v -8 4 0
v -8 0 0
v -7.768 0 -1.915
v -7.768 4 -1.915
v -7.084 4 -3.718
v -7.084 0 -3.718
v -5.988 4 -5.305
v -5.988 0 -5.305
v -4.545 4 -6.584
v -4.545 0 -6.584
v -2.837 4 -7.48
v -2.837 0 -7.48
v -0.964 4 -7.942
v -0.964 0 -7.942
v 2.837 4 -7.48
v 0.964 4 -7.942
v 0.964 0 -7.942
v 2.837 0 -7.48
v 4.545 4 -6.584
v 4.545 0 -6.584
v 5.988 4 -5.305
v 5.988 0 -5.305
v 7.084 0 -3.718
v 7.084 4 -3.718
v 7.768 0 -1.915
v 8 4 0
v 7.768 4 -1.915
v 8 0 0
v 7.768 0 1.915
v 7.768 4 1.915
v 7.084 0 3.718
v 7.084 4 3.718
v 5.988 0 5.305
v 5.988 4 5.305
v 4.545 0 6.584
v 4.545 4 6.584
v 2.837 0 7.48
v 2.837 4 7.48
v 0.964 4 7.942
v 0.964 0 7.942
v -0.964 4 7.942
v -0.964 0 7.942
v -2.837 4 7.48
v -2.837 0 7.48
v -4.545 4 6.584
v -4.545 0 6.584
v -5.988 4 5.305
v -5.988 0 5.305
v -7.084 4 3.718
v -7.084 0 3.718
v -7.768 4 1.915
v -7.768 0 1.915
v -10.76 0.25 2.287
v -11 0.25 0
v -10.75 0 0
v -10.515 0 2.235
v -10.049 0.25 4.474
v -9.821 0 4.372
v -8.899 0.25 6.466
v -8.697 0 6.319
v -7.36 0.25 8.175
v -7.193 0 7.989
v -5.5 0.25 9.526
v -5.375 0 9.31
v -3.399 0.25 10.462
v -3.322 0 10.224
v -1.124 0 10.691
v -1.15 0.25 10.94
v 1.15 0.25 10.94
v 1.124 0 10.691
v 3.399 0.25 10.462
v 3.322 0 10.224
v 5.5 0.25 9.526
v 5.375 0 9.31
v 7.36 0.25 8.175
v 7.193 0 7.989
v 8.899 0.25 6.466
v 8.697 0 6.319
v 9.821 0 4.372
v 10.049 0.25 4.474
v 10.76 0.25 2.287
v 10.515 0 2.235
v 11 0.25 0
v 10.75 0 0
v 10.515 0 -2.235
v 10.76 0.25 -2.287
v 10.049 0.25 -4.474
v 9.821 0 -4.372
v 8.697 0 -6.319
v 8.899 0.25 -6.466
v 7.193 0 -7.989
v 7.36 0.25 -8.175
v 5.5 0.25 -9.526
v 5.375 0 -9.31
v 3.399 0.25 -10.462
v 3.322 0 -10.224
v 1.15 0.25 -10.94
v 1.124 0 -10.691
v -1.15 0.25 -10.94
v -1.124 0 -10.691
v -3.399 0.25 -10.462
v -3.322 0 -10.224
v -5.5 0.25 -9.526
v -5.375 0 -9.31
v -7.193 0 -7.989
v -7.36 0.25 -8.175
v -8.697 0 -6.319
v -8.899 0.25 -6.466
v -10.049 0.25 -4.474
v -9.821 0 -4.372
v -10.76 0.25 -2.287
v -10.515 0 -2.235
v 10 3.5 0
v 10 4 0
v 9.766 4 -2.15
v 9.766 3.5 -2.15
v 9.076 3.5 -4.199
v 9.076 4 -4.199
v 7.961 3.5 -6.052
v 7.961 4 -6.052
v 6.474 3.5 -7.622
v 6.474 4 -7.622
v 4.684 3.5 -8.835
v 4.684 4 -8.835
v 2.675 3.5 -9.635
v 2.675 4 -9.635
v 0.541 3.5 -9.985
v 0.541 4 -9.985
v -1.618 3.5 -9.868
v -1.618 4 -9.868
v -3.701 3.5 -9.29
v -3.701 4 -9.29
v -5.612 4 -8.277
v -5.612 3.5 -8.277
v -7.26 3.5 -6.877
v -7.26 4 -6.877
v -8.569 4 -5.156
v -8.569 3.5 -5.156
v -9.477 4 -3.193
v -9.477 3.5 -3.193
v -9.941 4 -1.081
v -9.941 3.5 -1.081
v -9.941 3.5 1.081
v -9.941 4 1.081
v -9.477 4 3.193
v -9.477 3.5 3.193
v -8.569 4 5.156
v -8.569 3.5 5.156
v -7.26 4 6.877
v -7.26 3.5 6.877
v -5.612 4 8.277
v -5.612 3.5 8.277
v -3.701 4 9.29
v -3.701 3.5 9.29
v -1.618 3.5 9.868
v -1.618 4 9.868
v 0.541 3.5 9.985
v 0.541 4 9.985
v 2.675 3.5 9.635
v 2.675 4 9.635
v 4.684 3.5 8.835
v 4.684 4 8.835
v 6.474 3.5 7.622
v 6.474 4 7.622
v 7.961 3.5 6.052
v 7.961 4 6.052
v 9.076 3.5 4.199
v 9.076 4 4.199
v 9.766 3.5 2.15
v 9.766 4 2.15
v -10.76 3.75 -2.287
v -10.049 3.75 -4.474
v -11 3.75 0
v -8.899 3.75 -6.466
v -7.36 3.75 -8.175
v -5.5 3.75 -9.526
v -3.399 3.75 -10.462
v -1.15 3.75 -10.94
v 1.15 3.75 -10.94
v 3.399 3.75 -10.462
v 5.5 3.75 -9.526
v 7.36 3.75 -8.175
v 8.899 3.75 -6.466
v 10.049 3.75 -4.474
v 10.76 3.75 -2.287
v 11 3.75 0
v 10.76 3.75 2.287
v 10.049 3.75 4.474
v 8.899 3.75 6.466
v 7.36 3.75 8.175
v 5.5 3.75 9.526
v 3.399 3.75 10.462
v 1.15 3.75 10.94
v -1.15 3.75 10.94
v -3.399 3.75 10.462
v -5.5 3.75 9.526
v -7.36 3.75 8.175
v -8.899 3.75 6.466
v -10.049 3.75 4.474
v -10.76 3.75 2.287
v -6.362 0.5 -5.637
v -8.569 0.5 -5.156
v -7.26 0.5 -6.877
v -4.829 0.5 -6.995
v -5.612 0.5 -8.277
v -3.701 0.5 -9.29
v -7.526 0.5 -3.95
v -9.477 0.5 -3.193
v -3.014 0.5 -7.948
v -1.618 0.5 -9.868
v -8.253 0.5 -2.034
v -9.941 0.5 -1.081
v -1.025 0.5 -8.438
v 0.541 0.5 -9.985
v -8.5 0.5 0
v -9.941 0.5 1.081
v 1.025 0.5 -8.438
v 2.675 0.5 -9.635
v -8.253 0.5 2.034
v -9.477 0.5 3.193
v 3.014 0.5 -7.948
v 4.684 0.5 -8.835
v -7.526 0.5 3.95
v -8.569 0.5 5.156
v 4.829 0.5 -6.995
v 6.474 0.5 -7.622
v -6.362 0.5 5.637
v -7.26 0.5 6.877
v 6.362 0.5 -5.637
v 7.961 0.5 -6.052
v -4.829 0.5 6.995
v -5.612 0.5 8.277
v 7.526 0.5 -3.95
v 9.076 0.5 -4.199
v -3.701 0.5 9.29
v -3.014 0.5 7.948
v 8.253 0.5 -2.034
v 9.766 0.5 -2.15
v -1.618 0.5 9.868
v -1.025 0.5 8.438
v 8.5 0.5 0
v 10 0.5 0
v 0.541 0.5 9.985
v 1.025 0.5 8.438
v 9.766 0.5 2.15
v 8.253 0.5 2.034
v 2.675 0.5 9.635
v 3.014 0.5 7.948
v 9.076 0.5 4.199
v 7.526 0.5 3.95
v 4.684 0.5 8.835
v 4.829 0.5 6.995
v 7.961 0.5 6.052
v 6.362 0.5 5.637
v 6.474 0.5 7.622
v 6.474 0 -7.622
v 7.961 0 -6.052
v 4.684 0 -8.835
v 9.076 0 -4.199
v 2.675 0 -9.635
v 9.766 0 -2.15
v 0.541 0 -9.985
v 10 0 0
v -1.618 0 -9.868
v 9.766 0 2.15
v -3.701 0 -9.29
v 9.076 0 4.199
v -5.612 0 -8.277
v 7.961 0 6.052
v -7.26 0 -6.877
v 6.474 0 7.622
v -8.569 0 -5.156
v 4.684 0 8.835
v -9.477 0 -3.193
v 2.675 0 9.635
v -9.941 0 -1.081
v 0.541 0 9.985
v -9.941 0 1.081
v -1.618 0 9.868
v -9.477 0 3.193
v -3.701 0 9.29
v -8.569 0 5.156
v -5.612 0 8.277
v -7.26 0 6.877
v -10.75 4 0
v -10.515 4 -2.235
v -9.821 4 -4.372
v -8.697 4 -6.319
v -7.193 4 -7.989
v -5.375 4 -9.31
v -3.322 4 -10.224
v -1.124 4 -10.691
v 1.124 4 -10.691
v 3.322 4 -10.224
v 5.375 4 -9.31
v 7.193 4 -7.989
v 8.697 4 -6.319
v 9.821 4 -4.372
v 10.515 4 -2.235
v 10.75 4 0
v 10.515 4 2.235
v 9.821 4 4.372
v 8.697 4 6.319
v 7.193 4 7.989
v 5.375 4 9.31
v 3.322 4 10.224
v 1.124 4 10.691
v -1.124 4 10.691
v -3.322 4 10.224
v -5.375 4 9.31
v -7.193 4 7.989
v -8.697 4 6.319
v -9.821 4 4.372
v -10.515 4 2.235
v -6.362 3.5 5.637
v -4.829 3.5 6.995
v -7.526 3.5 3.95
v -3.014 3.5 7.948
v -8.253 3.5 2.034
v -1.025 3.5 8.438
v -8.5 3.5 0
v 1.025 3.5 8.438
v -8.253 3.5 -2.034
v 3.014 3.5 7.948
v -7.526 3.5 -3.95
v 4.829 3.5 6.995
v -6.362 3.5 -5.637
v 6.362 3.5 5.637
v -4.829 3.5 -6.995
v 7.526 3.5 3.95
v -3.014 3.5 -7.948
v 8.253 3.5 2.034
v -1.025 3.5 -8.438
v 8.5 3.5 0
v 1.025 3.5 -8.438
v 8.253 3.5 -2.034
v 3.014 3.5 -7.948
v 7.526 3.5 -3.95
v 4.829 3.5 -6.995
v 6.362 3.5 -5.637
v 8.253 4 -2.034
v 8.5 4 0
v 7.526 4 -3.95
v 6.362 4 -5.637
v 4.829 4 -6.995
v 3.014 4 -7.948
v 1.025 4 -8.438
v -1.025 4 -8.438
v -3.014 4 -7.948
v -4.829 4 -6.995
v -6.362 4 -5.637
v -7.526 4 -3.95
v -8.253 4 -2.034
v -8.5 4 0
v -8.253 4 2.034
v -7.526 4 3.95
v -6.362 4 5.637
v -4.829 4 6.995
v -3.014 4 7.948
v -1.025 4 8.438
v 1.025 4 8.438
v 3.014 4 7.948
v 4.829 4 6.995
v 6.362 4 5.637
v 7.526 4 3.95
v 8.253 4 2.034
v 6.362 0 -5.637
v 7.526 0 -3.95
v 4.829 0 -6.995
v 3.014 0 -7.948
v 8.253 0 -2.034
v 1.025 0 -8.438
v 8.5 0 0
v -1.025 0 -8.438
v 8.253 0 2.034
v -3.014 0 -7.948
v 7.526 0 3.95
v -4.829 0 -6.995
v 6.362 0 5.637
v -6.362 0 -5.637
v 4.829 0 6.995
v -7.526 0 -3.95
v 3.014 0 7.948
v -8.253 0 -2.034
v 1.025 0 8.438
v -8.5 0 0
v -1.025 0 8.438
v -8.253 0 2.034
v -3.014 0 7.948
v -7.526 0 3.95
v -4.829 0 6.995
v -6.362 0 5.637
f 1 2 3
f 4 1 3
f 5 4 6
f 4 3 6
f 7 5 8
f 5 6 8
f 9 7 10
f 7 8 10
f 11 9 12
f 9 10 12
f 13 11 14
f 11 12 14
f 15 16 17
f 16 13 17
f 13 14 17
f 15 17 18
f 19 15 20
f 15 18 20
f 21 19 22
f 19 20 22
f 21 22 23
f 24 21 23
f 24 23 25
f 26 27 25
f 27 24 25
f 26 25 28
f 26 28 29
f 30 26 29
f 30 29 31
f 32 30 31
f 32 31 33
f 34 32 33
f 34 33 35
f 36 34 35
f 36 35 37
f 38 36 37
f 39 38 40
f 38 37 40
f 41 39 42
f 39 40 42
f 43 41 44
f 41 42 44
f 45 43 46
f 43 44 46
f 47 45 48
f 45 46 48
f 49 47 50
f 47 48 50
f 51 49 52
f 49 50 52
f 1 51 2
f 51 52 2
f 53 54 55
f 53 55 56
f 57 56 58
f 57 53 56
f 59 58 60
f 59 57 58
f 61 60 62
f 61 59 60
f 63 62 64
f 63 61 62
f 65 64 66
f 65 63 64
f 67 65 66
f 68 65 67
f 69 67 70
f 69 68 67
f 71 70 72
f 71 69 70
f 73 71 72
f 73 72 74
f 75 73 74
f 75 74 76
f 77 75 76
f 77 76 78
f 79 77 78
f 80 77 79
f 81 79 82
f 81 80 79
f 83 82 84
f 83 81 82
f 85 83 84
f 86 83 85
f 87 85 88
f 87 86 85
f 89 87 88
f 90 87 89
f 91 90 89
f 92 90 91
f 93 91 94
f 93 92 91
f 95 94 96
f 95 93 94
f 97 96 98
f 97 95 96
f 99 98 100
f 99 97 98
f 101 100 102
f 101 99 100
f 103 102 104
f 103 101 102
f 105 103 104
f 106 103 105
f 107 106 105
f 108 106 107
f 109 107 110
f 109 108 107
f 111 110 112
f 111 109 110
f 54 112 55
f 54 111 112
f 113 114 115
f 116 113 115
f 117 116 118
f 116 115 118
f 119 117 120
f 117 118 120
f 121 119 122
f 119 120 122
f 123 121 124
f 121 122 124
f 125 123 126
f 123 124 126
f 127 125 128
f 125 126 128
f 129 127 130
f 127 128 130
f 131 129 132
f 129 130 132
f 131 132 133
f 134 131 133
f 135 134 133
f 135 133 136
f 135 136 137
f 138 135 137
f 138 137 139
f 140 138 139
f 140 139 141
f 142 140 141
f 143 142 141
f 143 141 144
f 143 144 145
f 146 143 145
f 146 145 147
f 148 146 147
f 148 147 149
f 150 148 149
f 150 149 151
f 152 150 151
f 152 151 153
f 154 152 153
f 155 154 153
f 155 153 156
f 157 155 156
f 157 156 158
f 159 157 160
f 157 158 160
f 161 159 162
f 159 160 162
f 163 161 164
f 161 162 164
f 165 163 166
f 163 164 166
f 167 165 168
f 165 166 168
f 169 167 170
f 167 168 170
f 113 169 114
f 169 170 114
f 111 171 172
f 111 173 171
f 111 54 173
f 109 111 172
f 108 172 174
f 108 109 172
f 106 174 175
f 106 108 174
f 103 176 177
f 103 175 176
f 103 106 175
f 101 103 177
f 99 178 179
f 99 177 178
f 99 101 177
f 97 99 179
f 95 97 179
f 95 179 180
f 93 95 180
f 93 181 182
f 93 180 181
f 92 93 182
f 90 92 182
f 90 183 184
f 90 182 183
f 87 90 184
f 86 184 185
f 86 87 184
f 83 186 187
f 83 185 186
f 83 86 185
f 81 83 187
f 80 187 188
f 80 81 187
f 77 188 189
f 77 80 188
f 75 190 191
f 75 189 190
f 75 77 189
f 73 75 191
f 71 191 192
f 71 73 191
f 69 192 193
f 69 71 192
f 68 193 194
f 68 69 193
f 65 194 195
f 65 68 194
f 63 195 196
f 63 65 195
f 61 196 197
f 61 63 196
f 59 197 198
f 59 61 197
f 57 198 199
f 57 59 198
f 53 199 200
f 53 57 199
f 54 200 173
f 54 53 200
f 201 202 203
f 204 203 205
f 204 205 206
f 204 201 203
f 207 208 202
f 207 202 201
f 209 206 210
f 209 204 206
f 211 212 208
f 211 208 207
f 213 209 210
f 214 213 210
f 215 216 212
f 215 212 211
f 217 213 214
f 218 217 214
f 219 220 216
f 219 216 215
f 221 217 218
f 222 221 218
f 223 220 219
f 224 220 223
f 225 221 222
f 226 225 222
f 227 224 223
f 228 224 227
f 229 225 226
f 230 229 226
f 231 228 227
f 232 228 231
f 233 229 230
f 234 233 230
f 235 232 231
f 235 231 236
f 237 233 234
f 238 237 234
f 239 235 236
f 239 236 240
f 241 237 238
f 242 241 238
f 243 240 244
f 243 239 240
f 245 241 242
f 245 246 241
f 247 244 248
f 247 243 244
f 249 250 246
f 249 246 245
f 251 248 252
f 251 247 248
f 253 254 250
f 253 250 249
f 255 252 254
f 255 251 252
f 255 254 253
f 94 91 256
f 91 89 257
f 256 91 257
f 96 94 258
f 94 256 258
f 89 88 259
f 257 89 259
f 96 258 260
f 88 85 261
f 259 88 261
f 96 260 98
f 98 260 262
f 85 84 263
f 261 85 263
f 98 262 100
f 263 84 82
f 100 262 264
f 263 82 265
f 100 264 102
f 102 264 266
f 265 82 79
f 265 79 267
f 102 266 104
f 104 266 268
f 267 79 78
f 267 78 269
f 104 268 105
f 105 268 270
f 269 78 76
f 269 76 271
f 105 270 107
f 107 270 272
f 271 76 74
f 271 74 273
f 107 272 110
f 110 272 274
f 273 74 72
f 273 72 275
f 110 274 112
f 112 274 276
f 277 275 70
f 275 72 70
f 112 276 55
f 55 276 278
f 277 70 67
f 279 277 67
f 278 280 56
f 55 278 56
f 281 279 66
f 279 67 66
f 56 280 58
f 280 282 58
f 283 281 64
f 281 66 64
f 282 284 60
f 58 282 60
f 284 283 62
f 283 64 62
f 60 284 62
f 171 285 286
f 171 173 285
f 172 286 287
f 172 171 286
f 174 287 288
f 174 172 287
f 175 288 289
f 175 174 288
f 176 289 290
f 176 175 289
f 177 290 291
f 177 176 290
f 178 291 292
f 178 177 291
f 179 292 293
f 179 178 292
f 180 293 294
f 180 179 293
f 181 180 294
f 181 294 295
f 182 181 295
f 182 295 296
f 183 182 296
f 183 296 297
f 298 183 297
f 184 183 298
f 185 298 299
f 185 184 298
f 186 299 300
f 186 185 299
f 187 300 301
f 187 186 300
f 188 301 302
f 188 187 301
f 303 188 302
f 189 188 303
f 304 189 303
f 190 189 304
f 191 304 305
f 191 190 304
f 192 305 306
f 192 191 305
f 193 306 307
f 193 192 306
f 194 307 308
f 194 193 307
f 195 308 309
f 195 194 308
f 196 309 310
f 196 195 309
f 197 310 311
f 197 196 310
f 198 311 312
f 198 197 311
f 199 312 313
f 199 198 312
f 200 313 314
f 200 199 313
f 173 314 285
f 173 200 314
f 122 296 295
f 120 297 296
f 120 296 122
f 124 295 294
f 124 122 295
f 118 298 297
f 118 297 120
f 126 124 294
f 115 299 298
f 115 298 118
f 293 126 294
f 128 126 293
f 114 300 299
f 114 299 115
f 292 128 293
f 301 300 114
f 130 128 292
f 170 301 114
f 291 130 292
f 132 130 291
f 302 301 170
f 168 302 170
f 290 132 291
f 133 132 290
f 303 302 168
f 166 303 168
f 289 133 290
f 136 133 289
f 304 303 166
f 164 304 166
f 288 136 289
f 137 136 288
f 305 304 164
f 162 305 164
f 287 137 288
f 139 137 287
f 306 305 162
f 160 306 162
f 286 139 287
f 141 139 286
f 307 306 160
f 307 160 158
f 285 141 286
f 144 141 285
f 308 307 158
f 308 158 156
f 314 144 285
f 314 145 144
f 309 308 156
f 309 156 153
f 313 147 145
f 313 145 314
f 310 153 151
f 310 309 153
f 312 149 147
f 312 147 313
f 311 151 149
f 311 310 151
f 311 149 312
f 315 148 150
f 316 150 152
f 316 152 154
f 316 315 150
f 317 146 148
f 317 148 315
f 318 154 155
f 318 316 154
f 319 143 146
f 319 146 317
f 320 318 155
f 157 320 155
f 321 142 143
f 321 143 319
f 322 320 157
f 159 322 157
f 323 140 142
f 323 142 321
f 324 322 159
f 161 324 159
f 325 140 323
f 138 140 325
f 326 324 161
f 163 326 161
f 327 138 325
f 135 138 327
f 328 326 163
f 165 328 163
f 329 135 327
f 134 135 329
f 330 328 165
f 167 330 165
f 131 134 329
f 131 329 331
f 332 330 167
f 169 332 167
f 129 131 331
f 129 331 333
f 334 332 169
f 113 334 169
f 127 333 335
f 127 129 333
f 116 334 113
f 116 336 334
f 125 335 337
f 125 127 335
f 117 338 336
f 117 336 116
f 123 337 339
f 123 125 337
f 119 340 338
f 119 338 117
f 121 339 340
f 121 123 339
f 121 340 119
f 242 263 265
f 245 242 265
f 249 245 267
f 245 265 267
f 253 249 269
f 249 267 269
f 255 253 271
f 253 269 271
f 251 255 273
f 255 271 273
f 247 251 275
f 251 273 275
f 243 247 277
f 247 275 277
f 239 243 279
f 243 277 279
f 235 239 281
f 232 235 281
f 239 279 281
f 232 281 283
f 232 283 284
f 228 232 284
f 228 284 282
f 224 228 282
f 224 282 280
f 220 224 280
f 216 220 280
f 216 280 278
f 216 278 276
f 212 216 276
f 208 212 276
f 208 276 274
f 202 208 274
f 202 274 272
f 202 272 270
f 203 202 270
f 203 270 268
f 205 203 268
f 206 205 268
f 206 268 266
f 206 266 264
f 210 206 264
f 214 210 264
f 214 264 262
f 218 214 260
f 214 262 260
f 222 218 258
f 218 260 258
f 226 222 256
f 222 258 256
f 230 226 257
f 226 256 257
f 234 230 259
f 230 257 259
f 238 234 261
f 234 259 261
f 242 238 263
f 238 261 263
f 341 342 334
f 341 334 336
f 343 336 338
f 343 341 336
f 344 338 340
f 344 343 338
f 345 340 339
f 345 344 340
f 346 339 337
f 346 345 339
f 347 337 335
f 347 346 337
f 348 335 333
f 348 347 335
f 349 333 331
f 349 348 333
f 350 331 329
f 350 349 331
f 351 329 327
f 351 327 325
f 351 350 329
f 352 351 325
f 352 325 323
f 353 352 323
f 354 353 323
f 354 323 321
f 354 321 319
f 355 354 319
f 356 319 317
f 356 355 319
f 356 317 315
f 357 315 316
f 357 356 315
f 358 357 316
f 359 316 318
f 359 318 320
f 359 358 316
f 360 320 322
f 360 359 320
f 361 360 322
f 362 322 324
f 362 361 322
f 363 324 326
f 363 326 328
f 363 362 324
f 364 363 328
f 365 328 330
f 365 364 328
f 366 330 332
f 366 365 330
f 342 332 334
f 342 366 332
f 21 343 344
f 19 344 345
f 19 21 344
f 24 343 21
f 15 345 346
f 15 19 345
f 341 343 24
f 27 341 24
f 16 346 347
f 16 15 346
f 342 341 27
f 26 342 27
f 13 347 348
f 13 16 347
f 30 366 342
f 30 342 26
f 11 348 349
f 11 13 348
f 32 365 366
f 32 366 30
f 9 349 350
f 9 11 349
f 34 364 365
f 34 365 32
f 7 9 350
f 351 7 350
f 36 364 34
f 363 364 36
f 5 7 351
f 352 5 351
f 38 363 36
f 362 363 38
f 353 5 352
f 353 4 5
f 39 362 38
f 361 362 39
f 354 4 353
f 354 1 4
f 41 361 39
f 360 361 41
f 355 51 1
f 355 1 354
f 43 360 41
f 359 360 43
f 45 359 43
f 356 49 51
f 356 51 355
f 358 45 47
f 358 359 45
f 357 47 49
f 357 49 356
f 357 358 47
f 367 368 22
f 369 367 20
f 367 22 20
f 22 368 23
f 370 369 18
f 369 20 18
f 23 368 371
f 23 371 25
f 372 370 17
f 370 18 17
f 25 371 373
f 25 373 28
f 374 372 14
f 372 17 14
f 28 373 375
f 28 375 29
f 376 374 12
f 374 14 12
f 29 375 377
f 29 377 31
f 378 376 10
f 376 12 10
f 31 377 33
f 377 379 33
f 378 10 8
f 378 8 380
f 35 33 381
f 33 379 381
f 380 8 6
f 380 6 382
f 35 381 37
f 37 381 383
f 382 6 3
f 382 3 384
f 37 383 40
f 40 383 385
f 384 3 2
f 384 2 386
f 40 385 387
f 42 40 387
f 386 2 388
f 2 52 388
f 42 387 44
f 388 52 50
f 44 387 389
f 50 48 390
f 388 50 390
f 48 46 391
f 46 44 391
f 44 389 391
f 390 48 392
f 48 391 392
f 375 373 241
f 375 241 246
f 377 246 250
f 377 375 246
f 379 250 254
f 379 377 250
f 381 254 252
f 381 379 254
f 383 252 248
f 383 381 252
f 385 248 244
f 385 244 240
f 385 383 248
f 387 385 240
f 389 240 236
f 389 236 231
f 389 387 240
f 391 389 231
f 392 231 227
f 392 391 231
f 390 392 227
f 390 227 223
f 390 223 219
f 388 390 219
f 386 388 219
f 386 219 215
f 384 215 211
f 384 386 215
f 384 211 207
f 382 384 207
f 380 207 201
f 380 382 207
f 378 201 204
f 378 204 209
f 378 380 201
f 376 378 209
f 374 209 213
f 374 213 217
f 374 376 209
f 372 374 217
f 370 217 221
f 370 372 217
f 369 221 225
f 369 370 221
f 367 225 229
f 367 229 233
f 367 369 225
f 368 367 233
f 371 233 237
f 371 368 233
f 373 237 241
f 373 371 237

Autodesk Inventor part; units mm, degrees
ref_plane "YZ Plane" through (0, 0, 0) normal (1, 0, 0) x (0, 1, 0)
ref_plane "XZ Plane" through (0, 0, 0) normal (0, 1, 0) x (-1, 0, 0)
ref_plane "XY Plane" through (0, 0, 0) normal (0, 0, 1) x (1, 0, 0)
sketch "Sketch1" plane through (0, 0, 0) normal (0, 1, 0) x (-1, 0, 0)
  circle A0 centre (0, 0) radius 8
  circle A1 centre (0, 0) radius 11
  dimension "d0" = 16
  dimension "d1" = 22
extrude "Extrusion1" add sketch "Sketch1" along normal blind 4
chamfer "Chamfer1" distance 0.25 angle 45 2 edges at (11, 4, 0) (11, 0, 0)
sketch "Sketch2" plane through (0, 4, 0) normal (0, 1, 0) x (1, 0, 0)
  circle A0 centre (0, 0) radius 8 construction
  circle A1 centre (0, 0) radius 8.5
  circle A2 centre (0, 0) radius 10
  dimension "d7" = 0.5
  dimension "d8" = 1.5
extrude "Extrusion2" cut sketch "Sketch2" against normal blind 0.5
sketch "Sketch3" plane through (0, 0, 0) normal (0, -1, 0) x (1, 0, 0)
  circle A0 centre (0, 0) radius 10 projected
  circle A1 centre (0, 0) radius 8.5 projected
extrude "Extrusion3" cut sketch "Sketch3" against normal blind 0.5
properties part number "16mm ID x 22mm OD x 4mm Thickness Ball Bearing"
